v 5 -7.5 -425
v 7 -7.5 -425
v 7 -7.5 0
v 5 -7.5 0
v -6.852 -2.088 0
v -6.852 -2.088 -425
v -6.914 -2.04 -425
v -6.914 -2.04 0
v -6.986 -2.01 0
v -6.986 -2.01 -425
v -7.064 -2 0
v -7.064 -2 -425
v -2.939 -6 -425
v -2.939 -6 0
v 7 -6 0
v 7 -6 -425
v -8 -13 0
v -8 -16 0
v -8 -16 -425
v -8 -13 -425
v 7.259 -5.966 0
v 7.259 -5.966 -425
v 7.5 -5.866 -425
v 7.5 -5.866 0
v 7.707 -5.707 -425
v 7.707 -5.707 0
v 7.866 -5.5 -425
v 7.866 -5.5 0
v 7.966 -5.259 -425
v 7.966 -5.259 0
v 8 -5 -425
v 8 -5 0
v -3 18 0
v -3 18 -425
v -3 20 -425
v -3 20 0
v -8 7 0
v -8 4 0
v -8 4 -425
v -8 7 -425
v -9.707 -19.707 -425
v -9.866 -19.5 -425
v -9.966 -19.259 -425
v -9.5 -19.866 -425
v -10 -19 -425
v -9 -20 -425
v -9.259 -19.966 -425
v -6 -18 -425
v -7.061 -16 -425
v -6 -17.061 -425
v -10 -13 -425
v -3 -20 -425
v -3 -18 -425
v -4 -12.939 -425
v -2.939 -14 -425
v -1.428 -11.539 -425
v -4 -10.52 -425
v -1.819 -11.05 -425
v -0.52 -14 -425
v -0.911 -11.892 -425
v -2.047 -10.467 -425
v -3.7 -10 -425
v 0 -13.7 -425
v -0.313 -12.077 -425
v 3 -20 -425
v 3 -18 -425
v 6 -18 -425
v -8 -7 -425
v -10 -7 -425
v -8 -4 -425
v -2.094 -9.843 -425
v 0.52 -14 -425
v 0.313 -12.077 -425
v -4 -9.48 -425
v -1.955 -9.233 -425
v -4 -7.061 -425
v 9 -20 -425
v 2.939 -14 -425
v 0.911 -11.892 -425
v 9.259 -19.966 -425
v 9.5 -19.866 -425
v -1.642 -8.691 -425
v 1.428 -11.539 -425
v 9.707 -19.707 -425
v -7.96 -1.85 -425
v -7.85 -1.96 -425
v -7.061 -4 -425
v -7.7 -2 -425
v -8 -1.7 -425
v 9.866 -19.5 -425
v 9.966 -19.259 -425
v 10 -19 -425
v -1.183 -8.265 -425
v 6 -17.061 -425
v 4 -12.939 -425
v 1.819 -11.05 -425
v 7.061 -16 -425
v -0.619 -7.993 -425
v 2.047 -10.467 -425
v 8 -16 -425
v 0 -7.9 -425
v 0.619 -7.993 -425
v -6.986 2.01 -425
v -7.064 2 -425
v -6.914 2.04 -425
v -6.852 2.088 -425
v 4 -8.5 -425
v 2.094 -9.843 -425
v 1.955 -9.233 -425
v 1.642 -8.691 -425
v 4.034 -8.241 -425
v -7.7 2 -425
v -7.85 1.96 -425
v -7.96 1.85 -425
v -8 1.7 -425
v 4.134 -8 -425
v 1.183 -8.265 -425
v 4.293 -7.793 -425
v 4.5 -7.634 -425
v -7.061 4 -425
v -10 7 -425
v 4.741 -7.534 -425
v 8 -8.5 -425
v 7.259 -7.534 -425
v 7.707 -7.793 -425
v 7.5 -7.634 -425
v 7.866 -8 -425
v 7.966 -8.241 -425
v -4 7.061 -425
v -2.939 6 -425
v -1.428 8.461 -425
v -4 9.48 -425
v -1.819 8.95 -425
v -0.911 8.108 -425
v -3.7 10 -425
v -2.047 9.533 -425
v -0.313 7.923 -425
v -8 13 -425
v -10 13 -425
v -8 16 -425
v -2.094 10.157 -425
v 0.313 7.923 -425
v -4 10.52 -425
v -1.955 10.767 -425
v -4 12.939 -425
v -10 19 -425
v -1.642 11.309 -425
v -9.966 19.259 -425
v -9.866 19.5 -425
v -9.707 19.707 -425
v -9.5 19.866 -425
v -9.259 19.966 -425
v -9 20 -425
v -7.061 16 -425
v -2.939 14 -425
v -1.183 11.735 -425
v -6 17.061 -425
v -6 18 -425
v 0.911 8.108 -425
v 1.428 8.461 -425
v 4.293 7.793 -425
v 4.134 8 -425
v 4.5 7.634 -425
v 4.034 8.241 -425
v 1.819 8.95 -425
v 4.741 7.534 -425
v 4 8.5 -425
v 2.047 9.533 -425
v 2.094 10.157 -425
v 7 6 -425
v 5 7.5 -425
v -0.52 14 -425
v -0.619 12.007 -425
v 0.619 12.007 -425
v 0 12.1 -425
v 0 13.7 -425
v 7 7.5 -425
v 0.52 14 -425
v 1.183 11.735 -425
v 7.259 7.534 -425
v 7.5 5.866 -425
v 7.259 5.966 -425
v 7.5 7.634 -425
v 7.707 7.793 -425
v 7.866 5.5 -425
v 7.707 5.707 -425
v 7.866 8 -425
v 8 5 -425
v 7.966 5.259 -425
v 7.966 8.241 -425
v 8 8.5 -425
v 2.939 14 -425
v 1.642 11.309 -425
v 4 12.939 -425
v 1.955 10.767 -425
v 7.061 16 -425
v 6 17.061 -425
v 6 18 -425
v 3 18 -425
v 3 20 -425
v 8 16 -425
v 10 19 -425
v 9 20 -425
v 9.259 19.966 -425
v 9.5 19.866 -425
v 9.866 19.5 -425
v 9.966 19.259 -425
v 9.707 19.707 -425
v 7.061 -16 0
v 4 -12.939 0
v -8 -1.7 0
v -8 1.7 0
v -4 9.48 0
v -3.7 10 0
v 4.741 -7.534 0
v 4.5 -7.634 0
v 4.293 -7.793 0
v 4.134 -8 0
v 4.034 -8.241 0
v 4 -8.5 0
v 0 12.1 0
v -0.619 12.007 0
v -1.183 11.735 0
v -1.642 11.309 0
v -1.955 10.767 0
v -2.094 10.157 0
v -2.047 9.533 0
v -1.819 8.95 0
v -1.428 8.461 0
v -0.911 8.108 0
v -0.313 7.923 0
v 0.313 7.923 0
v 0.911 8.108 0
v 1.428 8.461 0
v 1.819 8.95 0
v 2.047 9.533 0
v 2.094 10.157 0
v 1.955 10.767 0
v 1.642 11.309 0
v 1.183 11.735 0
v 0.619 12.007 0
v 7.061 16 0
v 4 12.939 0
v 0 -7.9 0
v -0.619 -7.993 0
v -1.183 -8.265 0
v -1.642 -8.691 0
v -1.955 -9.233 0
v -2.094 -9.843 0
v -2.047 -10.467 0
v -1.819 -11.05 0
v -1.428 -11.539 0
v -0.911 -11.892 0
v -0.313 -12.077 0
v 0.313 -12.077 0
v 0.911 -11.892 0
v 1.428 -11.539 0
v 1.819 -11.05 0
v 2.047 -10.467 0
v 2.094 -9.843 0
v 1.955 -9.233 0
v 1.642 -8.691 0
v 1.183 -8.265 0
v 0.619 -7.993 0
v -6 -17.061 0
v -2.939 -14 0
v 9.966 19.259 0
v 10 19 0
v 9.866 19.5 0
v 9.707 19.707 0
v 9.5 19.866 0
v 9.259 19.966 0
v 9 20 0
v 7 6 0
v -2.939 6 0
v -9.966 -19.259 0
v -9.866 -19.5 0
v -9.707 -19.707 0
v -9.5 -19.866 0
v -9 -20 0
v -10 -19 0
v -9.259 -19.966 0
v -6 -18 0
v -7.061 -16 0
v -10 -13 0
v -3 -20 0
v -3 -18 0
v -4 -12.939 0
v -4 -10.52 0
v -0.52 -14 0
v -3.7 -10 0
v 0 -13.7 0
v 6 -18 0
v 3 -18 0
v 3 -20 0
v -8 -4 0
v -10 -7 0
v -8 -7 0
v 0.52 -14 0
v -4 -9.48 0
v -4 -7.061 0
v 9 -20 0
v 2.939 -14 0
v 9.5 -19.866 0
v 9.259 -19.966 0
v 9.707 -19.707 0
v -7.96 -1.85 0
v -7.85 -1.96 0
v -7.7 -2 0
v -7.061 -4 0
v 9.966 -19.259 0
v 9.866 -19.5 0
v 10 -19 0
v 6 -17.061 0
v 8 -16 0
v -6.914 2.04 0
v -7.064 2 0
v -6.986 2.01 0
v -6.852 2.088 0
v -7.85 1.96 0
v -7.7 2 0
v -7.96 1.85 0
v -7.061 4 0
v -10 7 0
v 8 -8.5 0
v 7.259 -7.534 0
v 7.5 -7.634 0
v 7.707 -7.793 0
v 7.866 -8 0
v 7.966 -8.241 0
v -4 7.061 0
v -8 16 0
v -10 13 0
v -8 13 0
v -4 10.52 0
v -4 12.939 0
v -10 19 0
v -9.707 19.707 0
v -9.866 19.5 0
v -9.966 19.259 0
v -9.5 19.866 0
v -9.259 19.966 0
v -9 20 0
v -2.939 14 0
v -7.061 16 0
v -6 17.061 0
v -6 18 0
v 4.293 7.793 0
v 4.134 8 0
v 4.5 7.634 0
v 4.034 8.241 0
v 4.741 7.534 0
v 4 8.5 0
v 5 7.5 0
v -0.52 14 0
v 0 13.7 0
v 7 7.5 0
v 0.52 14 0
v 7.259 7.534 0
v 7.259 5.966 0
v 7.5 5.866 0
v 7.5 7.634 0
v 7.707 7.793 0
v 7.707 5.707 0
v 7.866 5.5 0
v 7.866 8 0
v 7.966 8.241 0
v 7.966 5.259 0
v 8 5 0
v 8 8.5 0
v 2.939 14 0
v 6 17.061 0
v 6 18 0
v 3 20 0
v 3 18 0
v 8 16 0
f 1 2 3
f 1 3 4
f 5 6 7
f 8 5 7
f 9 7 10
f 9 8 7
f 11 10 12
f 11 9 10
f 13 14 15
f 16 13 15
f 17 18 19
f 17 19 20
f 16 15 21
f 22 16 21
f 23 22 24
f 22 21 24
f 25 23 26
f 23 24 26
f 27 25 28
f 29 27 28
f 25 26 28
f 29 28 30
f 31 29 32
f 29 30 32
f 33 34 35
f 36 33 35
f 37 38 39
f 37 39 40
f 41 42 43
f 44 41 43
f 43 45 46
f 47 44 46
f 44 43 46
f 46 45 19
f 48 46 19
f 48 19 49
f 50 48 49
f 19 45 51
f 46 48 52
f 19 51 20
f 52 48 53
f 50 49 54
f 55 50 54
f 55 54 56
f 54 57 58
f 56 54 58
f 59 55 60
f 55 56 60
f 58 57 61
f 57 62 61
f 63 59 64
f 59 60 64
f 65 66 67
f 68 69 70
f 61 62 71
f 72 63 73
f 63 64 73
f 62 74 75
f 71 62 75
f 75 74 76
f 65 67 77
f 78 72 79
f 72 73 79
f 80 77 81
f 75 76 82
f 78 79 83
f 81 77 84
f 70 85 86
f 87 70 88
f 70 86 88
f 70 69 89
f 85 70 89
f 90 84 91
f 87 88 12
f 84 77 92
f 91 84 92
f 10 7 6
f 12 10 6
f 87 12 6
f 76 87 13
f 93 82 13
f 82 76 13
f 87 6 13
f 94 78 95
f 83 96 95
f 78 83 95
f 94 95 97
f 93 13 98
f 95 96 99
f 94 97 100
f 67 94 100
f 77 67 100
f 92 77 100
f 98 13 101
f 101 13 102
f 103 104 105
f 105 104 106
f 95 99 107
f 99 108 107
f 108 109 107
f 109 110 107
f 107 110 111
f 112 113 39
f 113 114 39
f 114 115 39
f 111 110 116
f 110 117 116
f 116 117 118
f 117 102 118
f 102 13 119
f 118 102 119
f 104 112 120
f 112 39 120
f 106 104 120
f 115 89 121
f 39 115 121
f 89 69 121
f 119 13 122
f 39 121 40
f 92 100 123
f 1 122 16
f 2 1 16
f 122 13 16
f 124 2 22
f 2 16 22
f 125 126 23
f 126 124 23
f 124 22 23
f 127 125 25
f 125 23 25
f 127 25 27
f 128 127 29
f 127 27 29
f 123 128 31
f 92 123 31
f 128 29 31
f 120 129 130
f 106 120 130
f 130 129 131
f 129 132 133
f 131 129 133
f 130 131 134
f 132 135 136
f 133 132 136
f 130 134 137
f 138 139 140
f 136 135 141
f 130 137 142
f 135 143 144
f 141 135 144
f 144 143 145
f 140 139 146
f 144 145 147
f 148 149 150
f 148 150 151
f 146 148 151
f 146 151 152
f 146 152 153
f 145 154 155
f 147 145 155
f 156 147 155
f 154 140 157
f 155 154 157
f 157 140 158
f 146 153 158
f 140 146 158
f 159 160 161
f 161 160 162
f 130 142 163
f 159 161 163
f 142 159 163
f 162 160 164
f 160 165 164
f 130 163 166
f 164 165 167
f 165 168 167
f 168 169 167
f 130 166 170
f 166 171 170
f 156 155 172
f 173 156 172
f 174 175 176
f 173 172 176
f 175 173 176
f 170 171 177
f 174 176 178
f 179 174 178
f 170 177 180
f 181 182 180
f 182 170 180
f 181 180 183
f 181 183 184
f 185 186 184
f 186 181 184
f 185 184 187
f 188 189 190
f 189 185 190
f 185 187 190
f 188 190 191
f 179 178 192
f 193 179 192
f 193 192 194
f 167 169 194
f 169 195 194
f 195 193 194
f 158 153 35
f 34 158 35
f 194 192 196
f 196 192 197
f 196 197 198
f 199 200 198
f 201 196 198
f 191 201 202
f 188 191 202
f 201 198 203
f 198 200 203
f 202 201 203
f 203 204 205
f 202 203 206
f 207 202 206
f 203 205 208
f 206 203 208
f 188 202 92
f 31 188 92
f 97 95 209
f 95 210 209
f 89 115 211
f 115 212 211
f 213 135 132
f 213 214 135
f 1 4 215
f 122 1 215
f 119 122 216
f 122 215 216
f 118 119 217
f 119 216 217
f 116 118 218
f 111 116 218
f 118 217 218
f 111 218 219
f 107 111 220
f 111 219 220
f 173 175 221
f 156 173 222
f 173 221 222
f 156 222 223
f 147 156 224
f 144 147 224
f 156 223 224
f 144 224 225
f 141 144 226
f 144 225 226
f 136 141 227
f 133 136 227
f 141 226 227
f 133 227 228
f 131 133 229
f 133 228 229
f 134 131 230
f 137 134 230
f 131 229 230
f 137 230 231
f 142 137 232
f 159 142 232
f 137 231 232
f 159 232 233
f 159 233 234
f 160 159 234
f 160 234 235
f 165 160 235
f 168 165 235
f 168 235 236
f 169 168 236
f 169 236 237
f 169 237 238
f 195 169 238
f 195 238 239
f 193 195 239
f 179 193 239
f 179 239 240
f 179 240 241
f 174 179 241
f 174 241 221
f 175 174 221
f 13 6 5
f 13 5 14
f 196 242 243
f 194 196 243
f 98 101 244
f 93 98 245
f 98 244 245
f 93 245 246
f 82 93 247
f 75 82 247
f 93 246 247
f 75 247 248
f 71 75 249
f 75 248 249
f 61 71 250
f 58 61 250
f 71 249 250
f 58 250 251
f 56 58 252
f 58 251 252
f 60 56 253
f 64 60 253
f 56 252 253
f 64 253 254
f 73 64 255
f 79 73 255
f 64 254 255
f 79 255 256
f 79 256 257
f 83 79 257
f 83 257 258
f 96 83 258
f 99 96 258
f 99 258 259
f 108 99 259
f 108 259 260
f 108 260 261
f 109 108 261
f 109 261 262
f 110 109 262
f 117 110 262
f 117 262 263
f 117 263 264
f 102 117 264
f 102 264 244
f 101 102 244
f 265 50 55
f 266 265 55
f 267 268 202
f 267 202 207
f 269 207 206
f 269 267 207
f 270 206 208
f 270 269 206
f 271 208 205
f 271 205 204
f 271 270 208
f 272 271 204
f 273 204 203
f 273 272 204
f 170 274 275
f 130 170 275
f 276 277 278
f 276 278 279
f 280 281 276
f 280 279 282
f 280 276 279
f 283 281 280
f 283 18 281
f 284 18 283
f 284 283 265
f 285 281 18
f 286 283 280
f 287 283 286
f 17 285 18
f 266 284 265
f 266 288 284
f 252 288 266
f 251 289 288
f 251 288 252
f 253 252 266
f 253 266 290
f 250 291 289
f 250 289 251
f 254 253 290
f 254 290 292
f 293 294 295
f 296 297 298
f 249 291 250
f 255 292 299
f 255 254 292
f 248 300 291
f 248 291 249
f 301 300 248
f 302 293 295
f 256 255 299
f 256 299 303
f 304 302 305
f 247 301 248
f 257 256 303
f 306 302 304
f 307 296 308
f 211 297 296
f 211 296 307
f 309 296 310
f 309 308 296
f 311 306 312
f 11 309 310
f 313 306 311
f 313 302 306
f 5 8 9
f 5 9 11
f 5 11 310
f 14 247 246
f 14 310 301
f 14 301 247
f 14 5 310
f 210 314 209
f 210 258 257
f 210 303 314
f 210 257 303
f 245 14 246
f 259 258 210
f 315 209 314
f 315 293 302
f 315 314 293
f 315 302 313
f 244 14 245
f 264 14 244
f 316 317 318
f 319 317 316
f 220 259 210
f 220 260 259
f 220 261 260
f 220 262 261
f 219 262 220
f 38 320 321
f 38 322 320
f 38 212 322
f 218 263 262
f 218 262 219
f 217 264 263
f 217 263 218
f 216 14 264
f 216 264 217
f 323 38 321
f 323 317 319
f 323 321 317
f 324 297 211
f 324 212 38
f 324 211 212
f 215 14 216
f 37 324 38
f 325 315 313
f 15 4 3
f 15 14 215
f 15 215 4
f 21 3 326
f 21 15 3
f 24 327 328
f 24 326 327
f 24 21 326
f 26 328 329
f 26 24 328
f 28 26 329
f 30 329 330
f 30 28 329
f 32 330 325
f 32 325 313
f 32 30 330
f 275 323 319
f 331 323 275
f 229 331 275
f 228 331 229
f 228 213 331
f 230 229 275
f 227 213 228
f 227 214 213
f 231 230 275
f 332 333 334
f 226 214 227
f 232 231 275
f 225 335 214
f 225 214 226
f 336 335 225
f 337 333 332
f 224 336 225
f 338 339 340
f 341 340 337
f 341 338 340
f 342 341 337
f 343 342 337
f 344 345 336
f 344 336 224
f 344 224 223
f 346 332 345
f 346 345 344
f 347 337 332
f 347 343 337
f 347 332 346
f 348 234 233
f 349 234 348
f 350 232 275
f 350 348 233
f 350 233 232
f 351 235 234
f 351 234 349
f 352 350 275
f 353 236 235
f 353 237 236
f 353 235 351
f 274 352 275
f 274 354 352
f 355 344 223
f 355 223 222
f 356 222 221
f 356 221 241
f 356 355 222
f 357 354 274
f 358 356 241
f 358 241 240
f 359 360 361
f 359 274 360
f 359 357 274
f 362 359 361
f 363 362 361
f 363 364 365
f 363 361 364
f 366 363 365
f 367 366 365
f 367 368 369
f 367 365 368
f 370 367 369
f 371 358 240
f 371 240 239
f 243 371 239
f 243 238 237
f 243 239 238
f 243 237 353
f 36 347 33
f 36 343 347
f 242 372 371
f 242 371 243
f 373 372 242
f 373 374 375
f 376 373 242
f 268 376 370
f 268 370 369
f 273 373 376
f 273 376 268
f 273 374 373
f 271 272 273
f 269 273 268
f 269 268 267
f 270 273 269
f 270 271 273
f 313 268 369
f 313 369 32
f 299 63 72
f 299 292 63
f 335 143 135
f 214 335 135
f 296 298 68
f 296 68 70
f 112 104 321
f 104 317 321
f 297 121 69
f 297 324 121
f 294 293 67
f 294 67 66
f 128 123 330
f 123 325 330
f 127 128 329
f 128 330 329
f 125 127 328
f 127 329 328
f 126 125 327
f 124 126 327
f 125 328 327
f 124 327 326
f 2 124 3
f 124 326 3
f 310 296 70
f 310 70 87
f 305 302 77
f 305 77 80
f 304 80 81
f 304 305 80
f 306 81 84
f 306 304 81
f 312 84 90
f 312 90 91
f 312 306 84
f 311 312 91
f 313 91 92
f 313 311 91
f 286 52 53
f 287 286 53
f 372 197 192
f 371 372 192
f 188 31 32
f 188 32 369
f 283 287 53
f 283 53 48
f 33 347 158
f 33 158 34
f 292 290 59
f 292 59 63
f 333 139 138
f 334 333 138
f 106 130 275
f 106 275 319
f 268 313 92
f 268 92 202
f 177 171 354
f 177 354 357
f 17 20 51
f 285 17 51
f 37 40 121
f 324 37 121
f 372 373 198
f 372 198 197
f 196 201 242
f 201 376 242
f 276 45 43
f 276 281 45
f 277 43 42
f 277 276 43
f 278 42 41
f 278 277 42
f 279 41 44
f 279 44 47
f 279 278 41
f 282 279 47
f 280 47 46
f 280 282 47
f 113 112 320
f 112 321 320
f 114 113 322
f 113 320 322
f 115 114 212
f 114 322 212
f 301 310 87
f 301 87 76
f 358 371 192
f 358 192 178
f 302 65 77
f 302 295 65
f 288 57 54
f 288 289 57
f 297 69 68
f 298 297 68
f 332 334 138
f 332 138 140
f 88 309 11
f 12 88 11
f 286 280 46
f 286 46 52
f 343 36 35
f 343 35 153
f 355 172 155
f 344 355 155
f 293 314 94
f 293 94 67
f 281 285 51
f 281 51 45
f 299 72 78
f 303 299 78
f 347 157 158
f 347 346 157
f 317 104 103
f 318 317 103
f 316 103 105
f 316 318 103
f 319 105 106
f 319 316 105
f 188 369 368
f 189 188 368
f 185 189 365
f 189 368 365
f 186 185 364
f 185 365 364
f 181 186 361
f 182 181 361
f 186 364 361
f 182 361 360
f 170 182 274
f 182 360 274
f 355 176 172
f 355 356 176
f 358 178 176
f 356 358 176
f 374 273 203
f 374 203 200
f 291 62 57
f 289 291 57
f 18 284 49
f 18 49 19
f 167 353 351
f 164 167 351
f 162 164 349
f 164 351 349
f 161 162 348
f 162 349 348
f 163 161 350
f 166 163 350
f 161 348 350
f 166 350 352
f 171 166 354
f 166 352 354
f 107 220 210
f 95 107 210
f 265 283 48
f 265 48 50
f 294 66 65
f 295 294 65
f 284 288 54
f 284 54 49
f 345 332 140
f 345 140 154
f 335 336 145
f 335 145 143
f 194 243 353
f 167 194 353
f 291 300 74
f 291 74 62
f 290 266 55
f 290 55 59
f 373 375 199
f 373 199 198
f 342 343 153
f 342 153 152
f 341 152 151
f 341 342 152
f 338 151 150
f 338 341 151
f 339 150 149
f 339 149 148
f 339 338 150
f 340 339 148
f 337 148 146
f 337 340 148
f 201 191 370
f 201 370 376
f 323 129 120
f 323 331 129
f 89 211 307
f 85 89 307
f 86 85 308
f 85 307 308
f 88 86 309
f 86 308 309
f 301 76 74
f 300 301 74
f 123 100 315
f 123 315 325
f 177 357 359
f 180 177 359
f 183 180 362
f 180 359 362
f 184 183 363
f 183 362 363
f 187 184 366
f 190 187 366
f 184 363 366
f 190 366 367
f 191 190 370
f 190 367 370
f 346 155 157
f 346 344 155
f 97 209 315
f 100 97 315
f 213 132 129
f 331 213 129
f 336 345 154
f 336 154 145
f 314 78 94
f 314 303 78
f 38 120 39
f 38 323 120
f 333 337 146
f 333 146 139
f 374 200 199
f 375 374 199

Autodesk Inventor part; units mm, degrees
sketch "Sketch_63" plane through (0, 0, 0) normal (0, 0, 1) x (1, 0, 0)
  line L0 (-10, -7) -> (-8, -7)
  line L1 (-8, -7) -> (-8, -4)
  line L2 (-8, -4) -> (-7.0607, -4)
  line L3 (-7.0607, -4) -> (-4, -7.0607)
  line L4 (-4, -7.0607) -> (-4, -9.4804)
  line L5 (-4, -9.4804) -> (-3.7, -10)
  line L6 (-3.7, -10) -> (-4, -10.5196)
  line L7 (-4, -10.5196) -> (-4, -12.9393)
  line L8 (-4, -12.9393) -> (-7.0607, -16)
  line L9 (-7.0607, -16) -> (-8, -16)
  line L10 (-8, -16) -> (-8, -13)
  line L11 (-8, -13) -> (-10, -13)
  line L12 (-10, -13) -> (-10, -19)
  arc A0 (-10, -19) -> (-9, -20) centre (-9, -19) ccw
  line L13 (-9, -20) -> (-3, -20)
  line L14 (-3, -20) -> (-3, -18)
  line L15 (-3, -18) -> (-6, -18)
  line L16 (-6, -18) -> (-6, -17.0607)
  line L17 (-6, -17.0607) -> (-2.9393, -14)
  line L18 (-2.9393, -14) -> (-0.5196, -14)
  line L19 (-0.5196, -14) -> (0, -13.7)
  line L20 (0, -13.7) -> (0.5196, -14)
  line L21 (0.5196, -14) -> (2.9393, -14)
  line L22 (2.9393, -14) -> (6, -17.0607)
  line L23 (6, -17.0607) -> (6, -18)
  line L24 (6, -18) -> (3, -18)
  line L25 (3, -18) -> (3, -20)
  line L26 (3, -20) -> (9, -20)
  arc A1 (9, -20) -> (10, -19) centre (9, -19) ccw
  line L27 (10, -19) -> (10, 19)
  arc A2 (10, 19) -> (9, 20) centre (9, 19) ccw
  line L28 (9, 20) -> (3, 20)
  line L29 (3, 20) -> (3, 18)
  line L30 (3, 18) -> (6, 18)
  line L31 (6, 18) -> (6, 17.0607)
  line L32 (6, 17.0607) -> (2.9393, 14)
  line L33 (2.9393, 14) -> (0.5196, 14)
  line L34 (0.5196, 14) -> (0, 13.7)
  line L35 (0, 13.7) -> (-0.5196, 14)
  line L36 (-0.5196, 14) -> (-2.9393, 14)
  line L37 (-2.9393, 14) -> (-6, 17.0607)
  line L38 (-6, 17.0607) -> (-6, 18)
  line L39 (-6, 18) -> (-3, 18)
  line L40 (-3, 18) -> (-3, 20)
  line L41 (-3, 20) -> (-9, 20)
  arc A3 (-9, 20) -> (-10, 19) centre (-9, 19) ccw
  line L42 (-10, 19) -> (-10, 13)
  line L43 (-10, 13) -> (-8, 13)
  line L44 (-8, 13) -> (-8, 16)
  line L45 (-8, 16) -> (-7.0607, 16)
  line L46 (-7.0607, 16) -> (-4, 12.9393)
  line L47 (-4, 12.9393) -> (-4, 10.5196)
  line L48 (-4, 10.5196) -> (-3.7, 10)
  line L49 (-3.7, 10) -> (-4, 9.4804)
  line L50 (-4, 9.4804) -> (-4, 7.0607)
  line L51 (-4, 7.0607) -> (-7.0607, 4)
  line L52 (-7.0607, 4) -> (-8, 4)
  line L53 (-8, 4) -> (-8, 7)
  line L54 (-8, 7) -> (-10, 7)
  line L55 (-10, 7) -> (-10, -7)
  line L56 (4, 12.9393) -> (4, 8.5)
  arc A4 (4, 8.5) -> (5, 7.5) centre (5, 8.5) ccw
  line L57 (5, 7.5) -> (7, 7.5)
  arc A5 (7, 7.5) -> (8, 8.5) centre (7, 8.5) ccw
  line L58 (8, 8.5) -> (8, 16)
  line L59 (8, 16) -> (7.0607, 16)
  line L60 (7.0607, 16) -> (4, 12.9393)
  line L61 (4, -12.9393) -> (7.0607, -16)
  line L62 (7.0607, -16) -> (8, -16)
  line L63 (8, -16) -> (8, -8.5)
  arc A6 (8, -8.5) -> (7, -7.5) centre (7, -8.5) ccw
  line L64 (7, -7.5) -> (5, -7.5)
  arc A7 (5, -7.5) -> (4, -8.5) centre (5, -8.5) ccw
  line L65 (4, -8.5) -> (4, -12.9393)
  line L66 (-8, 1.7) -> (-8, -1.7)
  arc A8 (-8, -1.7) -> (-7.7, -2) centre (-7.7, -1.7) ccw
  line L67 (-7.7, -2) -> (-7.0636, -2)
  arc A9 (-6.8515, -2.0879) -> (-7.0636, -2) centre (-7.0636, -2.3) ccw
  line L68 (-6.8515, -2.0879) -> (-2.9393, -6)
  line L69 (-2.9393, -6) -> (7, -6)
  arc A10 (7, -6) -> (8, -5) centre (7, -5) ccw
  line L70 (8, -5) -> (8, 5)
  arc A11 (8, 5) -> (7, 6) centre (7, 5) ccw
  line L71 (7, 6) -> (-2.9393, 6)
  line L72 (-2.9393, 6) -> (-6.8515, 2.0879)
  arc A12 (-7.0636, 2) -> (-6.8515, 2.0879) centre (-7.0636, 2.3) ccw
  line L73 (-7.0636, 2) -> (-7.7, 2)
  arc A13 (-7.7, 2) -> (-8, 1.7) centre (-7.7, 1.7) ccw
extrude "Extrusion1" add sketch "Sketch_63" against normal blind 425
sketch "Sketch2" plane through (0, 0, -425) normal (0, 0, -1) x (-1, 0, 0)
  point P0 (0, 10)
hole "Hole1" at (0, 10, -425) direction (0, 0, 1) diameter 4.2 end through all
pattern_linear "Rectangular Pattern1" count 2 spacing 20 along (0, -1, 0) of "Hole1"
ref_plane "C1_XY" through (0, 0, 0) normal (0, 0, 1) x (1, 0, 0)
ref_plane "C1_YZ" through (0, 0, 0) normal (1, 0, 0) x (0, 1, 0)
ref_plane "C1_ZX" through (0, 0, 0) normal (0, 1, 0) x (0, 0, 1)
thread "Thread1" size "M5x0.8" class "6H" standard "ANSI Metric M Profile" length 10
thread "Thread2" size "M5x0.8" class "6H" standard "ANSI Metric M Profile" length 10
thread "Thread3" size "M5x0.8" class "6H" standard "ANSI Metric M Profile" length 10
thread "Thread4" size "M4.5x0.75" class "6H" standard "ANSI Metric M Profile" length 10
properties part number "HFSF5-2040-425" material "Aluminum 6061"
